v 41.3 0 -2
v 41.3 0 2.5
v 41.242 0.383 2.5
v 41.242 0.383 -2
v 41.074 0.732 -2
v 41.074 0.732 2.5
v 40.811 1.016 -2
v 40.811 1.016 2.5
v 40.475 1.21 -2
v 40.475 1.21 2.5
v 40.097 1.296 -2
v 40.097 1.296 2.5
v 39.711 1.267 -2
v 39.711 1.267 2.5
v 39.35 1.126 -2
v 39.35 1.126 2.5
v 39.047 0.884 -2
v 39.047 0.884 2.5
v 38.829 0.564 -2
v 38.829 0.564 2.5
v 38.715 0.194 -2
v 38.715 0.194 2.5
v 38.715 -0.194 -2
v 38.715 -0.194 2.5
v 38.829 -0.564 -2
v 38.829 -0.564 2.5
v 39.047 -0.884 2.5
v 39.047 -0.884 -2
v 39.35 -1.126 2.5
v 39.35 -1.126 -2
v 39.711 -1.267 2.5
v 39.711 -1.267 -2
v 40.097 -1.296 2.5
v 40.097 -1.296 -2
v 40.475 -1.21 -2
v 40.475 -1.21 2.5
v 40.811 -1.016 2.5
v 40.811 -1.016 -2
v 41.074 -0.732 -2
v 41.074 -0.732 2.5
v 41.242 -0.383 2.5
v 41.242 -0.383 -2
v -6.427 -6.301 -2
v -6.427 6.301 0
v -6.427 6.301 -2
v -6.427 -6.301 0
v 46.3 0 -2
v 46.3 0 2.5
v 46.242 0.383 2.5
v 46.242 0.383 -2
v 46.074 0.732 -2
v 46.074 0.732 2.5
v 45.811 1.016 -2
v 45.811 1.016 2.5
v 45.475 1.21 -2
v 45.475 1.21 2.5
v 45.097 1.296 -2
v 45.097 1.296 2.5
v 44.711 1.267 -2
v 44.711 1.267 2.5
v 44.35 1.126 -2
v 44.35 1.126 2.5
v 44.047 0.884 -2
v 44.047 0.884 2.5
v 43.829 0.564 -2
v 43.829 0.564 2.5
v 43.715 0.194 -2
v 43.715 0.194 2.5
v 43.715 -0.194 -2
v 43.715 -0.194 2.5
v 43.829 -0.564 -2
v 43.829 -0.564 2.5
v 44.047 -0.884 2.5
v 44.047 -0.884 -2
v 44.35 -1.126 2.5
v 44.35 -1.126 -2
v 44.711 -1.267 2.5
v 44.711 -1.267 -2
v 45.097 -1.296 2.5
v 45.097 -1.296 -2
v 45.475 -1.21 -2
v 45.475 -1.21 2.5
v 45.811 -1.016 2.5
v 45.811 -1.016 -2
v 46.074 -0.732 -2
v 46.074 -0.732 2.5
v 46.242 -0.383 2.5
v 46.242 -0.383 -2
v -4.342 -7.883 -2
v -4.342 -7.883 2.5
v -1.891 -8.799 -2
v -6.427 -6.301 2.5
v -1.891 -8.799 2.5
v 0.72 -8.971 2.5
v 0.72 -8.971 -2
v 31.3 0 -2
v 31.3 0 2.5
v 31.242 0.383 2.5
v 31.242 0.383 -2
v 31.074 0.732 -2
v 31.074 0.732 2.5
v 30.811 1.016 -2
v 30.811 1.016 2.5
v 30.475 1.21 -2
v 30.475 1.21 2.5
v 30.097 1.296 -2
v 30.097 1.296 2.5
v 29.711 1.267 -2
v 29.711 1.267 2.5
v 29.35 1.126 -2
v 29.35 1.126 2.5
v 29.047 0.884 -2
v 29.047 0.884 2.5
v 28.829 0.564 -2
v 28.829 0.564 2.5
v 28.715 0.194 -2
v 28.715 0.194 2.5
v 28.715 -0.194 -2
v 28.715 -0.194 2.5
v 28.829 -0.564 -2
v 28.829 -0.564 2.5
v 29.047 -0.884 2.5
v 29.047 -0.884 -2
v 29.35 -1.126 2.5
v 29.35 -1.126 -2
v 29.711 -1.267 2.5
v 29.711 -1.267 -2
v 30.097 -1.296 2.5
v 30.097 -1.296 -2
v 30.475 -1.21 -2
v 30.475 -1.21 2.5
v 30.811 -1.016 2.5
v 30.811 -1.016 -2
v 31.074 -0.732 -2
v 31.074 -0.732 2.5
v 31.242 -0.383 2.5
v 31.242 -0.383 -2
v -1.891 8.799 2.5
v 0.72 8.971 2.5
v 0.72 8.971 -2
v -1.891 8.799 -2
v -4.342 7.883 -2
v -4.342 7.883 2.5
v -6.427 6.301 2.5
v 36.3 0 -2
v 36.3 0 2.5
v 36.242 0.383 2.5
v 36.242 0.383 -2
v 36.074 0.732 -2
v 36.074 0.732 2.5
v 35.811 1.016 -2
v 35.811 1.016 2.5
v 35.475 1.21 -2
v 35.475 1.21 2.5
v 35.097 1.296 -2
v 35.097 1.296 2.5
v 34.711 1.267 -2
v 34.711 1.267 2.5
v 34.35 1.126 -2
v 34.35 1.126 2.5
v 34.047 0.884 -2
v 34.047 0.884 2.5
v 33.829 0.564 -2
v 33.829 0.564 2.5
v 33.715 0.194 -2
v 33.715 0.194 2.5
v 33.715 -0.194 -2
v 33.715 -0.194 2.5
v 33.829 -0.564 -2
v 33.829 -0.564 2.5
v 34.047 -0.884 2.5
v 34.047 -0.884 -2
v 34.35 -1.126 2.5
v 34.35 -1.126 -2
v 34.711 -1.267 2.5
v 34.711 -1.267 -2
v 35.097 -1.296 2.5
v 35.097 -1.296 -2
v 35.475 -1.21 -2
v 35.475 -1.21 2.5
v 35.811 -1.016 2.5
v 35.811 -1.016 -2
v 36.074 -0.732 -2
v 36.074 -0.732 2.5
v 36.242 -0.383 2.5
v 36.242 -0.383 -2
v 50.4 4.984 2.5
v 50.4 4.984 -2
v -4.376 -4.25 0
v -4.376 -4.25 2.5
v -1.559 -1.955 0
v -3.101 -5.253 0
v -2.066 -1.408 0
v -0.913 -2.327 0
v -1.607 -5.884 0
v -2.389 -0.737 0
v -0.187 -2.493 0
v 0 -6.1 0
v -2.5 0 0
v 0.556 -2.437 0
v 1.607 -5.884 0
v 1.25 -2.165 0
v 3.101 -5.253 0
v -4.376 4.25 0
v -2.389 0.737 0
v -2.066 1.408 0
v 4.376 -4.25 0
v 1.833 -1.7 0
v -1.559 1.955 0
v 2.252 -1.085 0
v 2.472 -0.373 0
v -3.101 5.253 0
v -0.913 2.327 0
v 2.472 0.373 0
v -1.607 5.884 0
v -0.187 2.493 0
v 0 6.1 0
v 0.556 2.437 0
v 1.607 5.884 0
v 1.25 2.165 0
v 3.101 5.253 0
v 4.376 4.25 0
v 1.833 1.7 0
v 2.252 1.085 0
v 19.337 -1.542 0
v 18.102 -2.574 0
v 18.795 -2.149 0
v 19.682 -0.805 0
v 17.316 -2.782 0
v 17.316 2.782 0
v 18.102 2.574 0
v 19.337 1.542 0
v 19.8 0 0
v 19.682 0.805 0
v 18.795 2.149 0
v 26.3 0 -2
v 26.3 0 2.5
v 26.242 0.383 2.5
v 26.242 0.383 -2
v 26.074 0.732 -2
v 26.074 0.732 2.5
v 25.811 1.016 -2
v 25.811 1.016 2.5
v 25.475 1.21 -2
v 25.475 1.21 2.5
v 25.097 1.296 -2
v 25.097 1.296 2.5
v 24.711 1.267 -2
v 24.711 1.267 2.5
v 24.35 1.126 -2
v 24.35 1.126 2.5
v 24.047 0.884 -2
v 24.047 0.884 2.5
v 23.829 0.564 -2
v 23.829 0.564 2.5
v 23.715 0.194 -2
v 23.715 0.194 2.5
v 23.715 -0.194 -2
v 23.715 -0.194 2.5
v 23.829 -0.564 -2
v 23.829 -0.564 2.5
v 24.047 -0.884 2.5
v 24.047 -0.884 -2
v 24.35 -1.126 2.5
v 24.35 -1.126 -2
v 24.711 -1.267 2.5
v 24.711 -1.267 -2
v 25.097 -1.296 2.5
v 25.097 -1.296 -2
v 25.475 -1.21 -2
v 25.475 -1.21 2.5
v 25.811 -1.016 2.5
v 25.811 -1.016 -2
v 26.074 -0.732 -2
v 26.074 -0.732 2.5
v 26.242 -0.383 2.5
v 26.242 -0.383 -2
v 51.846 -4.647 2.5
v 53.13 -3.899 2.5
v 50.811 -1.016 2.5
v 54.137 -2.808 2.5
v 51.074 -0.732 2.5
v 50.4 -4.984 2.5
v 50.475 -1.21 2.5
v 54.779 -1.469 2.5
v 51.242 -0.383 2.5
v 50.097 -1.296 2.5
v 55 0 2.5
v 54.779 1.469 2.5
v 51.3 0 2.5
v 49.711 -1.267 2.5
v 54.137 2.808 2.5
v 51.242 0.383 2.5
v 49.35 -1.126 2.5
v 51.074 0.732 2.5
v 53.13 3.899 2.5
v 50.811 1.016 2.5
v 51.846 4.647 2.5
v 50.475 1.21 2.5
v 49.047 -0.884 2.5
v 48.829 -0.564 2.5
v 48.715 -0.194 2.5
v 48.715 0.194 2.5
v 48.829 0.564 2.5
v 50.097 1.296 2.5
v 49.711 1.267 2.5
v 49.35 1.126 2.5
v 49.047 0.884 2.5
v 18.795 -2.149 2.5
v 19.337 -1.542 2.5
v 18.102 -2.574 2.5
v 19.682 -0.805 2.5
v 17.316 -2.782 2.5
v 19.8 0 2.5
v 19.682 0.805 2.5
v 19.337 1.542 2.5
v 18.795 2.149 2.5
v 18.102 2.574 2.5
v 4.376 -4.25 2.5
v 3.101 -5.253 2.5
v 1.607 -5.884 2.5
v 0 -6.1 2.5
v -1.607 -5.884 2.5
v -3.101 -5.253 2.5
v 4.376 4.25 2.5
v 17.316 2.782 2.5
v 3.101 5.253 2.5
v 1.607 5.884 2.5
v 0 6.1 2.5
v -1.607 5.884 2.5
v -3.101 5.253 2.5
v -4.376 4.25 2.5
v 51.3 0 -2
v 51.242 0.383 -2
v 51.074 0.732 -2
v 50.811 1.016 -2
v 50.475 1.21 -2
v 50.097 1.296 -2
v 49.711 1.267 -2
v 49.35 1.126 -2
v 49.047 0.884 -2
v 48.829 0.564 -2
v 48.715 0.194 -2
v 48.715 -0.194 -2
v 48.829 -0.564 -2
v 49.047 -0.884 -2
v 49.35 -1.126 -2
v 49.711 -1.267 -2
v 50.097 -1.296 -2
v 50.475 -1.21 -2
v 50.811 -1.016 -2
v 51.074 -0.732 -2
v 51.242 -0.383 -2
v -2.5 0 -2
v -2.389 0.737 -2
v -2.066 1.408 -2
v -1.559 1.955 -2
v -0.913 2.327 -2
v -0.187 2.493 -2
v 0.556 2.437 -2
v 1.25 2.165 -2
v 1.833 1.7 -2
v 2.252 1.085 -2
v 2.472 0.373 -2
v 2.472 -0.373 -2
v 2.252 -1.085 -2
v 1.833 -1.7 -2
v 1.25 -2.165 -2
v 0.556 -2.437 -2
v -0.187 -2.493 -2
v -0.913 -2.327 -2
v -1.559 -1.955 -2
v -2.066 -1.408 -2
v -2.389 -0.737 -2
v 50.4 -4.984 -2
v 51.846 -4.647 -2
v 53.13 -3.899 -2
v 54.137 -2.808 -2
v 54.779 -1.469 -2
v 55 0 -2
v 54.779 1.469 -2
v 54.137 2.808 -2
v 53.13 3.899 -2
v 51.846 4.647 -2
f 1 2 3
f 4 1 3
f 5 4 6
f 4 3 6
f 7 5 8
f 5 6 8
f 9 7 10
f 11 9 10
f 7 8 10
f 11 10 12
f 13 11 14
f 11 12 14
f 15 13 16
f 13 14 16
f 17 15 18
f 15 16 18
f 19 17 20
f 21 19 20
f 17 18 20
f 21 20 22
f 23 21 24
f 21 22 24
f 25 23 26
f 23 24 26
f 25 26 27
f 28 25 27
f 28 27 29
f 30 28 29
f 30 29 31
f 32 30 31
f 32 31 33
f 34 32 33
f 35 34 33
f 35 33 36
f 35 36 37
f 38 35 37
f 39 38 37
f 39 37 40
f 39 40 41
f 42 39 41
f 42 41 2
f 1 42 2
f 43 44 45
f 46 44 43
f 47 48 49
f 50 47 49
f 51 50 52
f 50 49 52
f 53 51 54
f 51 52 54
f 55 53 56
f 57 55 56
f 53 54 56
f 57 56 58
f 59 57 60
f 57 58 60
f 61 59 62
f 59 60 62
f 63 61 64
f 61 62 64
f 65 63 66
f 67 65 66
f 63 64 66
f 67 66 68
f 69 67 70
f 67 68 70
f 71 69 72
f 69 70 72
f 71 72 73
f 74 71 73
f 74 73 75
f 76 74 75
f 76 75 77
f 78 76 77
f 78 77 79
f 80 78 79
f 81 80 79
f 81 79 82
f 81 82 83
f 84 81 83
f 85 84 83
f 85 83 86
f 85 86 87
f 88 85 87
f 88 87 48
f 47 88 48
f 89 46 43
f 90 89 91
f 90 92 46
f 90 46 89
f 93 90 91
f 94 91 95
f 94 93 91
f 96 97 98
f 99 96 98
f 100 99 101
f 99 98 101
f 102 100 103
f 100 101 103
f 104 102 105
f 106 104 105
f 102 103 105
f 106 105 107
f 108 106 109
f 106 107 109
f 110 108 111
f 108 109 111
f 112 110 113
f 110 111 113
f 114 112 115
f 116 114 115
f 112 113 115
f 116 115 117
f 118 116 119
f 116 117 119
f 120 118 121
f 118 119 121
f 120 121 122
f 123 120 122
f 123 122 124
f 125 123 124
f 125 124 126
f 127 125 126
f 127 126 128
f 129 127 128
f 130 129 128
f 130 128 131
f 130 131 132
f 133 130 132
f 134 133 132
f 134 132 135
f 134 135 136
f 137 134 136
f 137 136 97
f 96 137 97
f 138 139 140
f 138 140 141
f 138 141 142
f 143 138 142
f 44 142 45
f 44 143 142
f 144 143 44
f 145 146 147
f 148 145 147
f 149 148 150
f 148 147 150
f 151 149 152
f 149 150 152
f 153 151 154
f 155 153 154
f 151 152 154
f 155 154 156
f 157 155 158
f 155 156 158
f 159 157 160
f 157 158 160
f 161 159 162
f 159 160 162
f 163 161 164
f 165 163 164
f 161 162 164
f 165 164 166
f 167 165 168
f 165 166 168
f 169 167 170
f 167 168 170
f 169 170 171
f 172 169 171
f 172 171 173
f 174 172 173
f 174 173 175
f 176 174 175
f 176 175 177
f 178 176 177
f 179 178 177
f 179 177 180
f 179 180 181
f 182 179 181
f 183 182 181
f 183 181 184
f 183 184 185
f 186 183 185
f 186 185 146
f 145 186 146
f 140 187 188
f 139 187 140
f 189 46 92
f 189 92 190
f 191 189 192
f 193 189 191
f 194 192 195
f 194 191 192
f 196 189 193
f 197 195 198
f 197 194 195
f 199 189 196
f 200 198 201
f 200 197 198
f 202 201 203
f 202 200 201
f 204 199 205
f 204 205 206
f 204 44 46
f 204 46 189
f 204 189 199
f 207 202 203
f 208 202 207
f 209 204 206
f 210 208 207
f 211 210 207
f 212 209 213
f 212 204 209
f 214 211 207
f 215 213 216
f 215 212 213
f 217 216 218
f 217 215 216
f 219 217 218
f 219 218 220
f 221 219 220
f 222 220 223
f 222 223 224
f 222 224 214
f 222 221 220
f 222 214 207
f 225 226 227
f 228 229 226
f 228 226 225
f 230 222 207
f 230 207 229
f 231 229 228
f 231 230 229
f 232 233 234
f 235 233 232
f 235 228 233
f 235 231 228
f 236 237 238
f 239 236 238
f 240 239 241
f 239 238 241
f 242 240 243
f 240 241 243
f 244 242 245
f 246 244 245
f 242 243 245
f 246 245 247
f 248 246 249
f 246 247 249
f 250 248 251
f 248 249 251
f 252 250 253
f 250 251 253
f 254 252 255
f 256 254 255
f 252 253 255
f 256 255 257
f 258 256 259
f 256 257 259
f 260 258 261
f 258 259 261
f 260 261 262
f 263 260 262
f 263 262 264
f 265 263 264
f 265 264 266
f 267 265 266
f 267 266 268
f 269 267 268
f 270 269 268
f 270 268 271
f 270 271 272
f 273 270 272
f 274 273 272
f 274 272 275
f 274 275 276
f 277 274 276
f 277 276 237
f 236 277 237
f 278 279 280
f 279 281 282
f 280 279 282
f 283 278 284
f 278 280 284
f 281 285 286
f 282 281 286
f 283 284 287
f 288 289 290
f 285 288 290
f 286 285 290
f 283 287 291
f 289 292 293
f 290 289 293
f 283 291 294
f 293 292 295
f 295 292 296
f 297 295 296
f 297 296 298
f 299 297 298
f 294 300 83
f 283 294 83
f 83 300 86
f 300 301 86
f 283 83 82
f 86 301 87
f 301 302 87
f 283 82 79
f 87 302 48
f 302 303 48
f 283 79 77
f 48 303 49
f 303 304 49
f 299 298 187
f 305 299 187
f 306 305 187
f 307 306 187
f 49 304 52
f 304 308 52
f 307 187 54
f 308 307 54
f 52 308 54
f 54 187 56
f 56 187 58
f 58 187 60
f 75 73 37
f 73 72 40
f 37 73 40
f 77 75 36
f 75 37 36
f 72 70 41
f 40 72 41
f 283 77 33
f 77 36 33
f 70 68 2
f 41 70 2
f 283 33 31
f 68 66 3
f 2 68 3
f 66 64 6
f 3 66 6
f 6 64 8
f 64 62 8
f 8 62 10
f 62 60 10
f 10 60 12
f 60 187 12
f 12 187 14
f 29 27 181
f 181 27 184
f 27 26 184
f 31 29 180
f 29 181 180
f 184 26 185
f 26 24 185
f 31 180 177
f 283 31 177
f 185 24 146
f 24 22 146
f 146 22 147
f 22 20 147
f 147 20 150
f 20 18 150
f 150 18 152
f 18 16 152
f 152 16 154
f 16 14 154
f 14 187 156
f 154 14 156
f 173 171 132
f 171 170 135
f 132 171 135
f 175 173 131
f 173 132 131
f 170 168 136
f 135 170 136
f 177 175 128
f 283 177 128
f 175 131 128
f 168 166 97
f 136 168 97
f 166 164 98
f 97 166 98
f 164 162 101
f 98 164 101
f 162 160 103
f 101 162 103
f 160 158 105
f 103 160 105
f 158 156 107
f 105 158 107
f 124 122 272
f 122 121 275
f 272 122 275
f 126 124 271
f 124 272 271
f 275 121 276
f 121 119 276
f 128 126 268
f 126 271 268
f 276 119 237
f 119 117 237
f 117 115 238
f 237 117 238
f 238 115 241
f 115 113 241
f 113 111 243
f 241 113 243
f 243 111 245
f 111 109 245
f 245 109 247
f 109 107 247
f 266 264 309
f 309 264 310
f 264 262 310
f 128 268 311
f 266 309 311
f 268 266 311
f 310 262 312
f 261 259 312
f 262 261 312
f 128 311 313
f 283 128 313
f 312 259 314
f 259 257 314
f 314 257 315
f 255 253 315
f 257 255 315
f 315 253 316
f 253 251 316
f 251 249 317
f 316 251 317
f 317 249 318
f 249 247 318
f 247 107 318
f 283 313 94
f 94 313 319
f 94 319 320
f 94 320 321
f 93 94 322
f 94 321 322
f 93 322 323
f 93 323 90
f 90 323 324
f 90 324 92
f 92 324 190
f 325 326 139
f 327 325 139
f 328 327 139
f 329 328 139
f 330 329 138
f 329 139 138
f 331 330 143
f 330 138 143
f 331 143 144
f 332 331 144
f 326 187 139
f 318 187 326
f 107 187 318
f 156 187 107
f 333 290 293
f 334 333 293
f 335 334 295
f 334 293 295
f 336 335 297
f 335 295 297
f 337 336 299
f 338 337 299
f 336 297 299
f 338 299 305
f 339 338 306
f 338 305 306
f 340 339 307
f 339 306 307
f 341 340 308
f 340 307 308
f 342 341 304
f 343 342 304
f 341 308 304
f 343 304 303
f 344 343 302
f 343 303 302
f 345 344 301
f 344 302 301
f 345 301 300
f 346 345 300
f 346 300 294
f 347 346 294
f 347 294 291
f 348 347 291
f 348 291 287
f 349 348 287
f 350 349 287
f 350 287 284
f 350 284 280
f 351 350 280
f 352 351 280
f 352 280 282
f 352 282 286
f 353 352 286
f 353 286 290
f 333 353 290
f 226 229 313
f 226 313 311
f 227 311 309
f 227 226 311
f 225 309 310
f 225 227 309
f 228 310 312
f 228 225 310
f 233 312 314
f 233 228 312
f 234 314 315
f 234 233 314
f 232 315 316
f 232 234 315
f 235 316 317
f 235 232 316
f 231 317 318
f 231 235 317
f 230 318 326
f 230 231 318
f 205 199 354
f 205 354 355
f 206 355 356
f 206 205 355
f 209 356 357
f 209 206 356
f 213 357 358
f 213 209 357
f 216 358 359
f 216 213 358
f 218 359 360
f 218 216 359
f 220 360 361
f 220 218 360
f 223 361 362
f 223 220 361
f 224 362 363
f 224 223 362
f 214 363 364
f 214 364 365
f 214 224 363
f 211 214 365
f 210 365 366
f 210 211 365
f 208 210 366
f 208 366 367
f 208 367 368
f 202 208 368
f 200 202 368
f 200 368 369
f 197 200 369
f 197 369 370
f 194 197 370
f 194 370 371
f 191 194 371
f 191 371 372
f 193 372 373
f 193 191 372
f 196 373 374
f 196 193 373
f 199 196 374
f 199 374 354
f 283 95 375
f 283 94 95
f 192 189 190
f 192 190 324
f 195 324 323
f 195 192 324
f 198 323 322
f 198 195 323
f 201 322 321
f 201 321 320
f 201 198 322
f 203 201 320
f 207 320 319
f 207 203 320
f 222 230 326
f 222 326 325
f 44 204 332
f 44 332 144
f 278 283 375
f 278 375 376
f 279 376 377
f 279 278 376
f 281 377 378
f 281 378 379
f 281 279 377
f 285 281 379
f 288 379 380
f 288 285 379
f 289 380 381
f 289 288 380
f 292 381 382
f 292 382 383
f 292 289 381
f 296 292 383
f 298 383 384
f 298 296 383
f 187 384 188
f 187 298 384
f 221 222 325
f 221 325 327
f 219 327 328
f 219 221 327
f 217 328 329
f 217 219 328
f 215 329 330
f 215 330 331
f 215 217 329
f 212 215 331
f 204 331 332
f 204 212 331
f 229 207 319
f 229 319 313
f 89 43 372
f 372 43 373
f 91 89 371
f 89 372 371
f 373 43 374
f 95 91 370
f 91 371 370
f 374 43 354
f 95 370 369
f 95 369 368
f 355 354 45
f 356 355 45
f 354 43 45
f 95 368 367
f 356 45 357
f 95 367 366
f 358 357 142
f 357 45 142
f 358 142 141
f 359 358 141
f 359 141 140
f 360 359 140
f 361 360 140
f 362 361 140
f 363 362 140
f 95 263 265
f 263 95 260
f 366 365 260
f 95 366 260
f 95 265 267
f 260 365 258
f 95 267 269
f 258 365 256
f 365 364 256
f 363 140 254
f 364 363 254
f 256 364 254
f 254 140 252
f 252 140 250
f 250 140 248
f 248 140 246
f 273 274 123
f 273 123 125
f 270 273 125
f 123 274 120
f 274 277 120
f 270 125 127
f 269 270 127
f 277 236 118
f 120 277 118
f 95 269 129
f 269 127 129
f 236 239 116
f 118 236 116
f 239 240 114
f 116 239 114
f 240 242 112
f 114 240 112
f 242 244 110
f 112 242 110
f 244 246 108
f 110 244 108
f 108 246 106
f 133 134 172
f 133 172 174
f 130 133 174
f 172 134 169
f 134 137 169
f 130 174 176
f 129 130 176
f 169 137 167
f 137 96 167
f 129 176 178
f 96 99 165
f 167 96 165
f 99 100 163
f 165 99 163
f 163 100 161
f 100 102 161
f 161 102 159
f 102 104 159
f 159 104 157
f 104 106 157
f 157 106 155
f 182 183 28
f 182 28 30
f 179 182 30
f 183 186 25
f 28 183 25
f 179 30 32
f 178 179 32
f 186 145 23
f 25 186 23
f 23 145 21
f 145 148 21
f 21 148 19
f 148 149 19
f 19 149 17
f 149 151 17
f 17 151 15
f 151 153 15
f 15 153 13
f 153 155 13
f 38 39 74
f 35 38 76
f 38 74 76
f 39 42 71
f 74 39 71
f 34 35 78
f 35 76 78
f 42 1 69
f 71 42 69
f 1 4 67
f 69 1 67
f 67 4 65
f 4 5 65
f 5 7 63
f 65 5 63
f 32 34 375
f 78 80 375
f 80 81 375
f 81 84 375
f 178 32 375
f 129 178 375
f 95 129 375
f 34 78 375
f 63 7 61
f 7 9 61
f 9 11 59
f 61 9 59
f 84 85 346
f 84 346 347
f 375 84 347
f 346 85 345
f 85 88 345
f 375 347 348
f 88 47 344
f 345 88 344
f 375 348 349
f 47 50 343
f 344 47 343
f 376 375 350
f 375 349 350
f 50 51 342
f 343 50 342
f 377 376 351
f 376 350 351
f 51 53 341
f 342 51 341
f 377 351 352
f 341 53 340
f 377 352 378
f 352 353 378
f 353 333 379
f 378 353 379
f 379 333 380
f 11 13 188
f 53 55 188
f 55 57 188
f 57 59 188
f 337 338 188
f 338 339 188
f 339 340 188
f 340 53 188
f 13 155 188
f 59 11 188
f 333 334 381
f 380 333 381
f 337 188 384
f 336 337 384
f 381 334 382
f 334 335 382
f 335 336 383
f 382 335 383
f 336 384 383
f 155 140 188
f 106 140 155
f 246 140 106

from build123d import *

# Parameters (mm, degrees)
MAIN_DEPTH            = 2.5
ESQUISSE2_R           = 2.5
ORIGINALBRACKET_DEPTH = 2
ESQUISSE3_R           = 1.3
FIXINGHOLE_DEPTH      = 5.5
LPATTERN1_COUNT       = 6
LPATTERN1_PITCH       = 5


with BuildPart() as part:
    # Esquisse1 → Main (new body)
    with BuildSketch(Plane.XY):
        with BuildLine():
            Line((-4.375785644, 4.25), (-6.426543071, 6.300757427))
            ThreePointArc((-6.426543071, 6.300757427), (-3.150224217, 8.43066352), (0.72, 8.971153772))
            Line((0.72, 8.971153772), (50.4, 4.983974318))
            ThreePointArc((50.4, 4.983974318), (55, 0), (50.4, -4.983974318))
            Line((50.4, -4.983974318), (0.72, -8.971153772))
            ThreePointArc((0.72, -8.971153772), (-3.150224217, -8.43066352), (-6.426543071, -6.300757427))
            Line((-6.426543071, -6.300757427), (-4.375785644, -4.25))
            ThreePointArc((-4.375785644, -4.25), (0, -6.1), (4.375785644, -4.25))
            Line((4.375785644, -4.25), (17.31559729, -2.78215714))
            ThreePointArc((17.31559729, -2.78215714), (19.8, 0), (17.31559729, 2.78215714))
            Line((17.31559729, 2.78215714), (4.375785644, 4.25))
            ThreePointArc((4.375785644, 4.25), (0, 6.1), (-4.375785644, 4.25))
        make_face()
    extrude(amount=MAIN_DEPTH)

    # Esquisse2 → OriginalBracket (add)
    with BuildSketch(Plane(origin=(0, 0, 0), x_dir=(-1, 0, 0), z_dir=(0, 0, -1))):
        with BuildLine():
            Line((-0.72, -8.971153772), (-50.4, -4.983974318))
            ThreePointArc((-50.4, -4.983974318), (-55, 0), (-50.4, 4.983974318))
            Line((-50.4, 4.983974318), (-0.72, 8.971153772))
            ThreePointArc((-0.72, 8.971153772), (3.150224217, 8.43066352), (6.426543071, 6.300757427))
            Line((6.426543071, 6.300757427), (6.426543071, -6.300757427))
            ThreePointArc((6.426543071, -6.300757427), (3.150224217, -8.43066352), (-0.72, -8.971153772))
        make_face()
        Circle(ESQUISSE2_R, mode=Mode.SUBTRACT)
    extrude(amount=ORIGINALBRACKET_DEPTH)

    # Esquisse3 → FixingHole (cut, through all)
    with BuildSketch(Plane.XY.offset(2.5)):
        with Locations((50, 0)):
            Circle(ESQUISSE3_R)
    fixinghole = extrude(amount=-FIXINGHOLE_DEPTH, mode=Mode.SUBTRACT)

    # LPattern1: FixingHole ×6
    with Locations(*[(-i * LPATTERN1_PITCH, 0, 0) for i in range(1, LPATTERN1_COUNT)]):
        add(fixinghole, mode=Mode.SUBTRACT)


solid = part.part
